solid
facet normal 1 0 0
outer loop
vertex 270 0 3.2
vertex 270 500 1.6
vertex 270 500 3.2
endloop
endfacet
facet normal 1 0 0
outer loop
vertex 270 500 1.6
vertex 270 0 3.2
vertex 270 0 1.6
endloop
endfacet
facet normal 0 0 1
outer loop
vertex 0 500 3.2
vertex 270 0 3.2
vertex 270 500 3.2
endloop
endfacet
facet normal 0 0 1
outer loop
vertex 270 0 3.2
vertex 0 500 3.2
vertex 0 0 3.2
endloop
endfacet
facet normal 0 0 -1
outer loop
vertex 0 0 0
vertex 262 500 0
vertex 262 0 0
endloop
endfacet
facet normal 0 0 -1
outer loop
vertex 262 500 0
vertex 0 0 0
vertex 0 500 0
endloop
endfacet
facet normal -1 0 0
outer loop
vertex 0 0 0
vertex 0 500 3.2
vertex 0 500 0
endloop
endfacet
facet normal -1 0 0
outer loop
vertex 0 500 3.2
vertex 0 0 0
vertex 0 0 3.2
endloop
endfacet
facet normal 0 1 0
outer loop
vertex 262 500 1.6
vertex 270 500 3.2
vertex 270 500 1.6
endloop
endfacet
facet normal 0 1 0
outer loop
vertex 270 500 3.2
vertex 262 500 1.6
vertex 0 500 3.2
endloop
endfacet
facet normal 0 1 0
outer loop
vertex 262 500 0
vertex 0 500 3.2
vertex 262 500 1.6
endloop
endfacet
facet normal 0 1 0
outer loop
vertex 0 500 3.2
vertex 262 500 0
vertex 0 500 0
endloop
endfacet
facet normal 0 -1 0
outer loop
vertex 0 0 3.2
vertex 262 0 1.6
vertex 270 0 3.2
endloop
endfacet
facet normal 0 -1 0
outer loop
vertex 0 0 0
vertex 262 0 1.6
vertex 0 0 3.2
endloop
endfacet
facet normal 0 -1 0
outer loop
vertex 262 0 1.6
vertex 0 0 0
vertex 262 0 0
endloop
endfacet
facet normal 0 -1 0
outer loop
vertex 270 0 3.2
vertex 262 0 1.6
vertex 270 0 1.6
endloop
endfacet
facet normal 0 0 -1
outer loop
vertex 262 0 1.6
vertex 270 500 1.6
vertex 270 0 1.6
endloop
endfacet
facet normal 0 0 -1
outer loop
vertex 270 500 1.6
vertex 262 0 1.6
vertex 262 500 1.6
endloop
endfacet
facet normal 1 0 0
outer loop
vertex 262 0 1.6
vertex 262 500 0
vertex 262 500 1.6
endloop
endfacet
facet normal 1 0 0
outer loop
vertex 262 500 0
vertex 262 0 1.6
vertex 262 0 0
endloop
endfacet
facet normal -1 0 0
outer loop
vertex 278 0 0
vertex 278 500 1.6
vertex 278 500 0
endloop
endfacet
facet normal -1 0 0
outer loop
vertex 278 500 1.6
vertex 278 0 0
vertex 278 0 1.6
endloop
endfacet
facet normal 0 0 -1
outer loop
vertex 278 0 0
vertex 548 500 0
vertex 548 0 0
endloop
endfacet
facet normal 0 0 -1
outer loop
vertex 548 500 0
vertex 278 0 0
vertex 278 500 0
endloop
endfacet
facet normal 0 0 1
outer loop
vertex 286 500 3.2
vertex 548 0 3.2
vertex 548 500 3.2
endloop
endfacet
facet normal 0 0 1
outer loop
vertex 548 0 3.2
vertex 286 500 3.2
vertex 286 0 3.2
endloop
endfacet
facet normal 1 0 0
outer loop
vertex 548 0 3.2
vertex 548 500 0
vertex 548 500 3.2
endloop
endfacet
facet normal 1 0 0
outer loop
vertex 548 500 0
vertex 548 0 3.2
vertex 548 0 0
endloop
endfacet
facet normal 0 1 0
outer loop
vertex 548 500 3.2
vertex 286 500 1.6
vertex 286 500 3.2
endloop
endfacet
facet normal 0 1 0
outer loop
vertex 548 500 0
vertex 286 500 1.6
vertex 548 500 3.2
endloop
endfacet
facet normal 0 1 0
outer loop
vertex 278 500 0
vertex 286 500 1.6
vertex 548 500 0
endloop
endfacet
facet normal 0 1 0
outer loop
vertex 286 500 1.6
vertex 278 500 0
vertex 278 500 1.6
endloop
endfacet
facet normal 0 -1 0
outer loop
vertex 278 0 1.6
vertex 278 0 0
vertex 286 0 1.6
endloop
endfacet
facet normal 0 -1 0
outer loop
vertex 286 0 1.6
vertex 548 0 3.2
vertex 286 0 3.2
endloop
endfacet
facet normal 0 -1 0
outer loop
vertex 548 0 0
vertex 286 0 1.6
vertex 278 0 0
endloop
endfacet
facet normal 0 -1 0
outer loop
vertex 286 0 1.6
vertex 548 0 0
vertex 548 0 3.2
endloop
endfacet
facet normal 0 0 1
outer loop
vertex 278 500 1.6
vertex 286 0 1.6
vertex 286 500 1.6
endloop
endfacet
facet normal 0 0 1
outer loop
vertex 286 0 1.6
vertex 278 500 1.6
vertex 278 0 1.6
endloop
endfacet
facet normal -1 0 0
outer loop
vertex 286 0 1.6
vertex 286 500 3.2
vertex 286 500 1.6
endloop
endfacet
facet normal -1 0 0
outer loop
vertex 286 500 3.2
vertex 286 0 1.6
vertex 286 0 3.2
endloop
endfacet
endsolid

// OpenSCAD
//
// simple example of split backplane
//

thick = 3.2;
height = 500;
width = 270;

cut = 8;

sep = 0;


difference() {
     cube( [width, height, thick]);
     translate( [width-cut, -1, -1])
	  cube( [cut+1, height+2, 1+thick/2]);
}

rotate( [180, 0, 180])
translate( [-2*width-cut-sep, 0, -thick])
difference() {
     cube( [width, height, thick]);
     translate( [width-cut, -1, -1])
	  cube( [cut+1, height+2, 1+thick/2]);
}
